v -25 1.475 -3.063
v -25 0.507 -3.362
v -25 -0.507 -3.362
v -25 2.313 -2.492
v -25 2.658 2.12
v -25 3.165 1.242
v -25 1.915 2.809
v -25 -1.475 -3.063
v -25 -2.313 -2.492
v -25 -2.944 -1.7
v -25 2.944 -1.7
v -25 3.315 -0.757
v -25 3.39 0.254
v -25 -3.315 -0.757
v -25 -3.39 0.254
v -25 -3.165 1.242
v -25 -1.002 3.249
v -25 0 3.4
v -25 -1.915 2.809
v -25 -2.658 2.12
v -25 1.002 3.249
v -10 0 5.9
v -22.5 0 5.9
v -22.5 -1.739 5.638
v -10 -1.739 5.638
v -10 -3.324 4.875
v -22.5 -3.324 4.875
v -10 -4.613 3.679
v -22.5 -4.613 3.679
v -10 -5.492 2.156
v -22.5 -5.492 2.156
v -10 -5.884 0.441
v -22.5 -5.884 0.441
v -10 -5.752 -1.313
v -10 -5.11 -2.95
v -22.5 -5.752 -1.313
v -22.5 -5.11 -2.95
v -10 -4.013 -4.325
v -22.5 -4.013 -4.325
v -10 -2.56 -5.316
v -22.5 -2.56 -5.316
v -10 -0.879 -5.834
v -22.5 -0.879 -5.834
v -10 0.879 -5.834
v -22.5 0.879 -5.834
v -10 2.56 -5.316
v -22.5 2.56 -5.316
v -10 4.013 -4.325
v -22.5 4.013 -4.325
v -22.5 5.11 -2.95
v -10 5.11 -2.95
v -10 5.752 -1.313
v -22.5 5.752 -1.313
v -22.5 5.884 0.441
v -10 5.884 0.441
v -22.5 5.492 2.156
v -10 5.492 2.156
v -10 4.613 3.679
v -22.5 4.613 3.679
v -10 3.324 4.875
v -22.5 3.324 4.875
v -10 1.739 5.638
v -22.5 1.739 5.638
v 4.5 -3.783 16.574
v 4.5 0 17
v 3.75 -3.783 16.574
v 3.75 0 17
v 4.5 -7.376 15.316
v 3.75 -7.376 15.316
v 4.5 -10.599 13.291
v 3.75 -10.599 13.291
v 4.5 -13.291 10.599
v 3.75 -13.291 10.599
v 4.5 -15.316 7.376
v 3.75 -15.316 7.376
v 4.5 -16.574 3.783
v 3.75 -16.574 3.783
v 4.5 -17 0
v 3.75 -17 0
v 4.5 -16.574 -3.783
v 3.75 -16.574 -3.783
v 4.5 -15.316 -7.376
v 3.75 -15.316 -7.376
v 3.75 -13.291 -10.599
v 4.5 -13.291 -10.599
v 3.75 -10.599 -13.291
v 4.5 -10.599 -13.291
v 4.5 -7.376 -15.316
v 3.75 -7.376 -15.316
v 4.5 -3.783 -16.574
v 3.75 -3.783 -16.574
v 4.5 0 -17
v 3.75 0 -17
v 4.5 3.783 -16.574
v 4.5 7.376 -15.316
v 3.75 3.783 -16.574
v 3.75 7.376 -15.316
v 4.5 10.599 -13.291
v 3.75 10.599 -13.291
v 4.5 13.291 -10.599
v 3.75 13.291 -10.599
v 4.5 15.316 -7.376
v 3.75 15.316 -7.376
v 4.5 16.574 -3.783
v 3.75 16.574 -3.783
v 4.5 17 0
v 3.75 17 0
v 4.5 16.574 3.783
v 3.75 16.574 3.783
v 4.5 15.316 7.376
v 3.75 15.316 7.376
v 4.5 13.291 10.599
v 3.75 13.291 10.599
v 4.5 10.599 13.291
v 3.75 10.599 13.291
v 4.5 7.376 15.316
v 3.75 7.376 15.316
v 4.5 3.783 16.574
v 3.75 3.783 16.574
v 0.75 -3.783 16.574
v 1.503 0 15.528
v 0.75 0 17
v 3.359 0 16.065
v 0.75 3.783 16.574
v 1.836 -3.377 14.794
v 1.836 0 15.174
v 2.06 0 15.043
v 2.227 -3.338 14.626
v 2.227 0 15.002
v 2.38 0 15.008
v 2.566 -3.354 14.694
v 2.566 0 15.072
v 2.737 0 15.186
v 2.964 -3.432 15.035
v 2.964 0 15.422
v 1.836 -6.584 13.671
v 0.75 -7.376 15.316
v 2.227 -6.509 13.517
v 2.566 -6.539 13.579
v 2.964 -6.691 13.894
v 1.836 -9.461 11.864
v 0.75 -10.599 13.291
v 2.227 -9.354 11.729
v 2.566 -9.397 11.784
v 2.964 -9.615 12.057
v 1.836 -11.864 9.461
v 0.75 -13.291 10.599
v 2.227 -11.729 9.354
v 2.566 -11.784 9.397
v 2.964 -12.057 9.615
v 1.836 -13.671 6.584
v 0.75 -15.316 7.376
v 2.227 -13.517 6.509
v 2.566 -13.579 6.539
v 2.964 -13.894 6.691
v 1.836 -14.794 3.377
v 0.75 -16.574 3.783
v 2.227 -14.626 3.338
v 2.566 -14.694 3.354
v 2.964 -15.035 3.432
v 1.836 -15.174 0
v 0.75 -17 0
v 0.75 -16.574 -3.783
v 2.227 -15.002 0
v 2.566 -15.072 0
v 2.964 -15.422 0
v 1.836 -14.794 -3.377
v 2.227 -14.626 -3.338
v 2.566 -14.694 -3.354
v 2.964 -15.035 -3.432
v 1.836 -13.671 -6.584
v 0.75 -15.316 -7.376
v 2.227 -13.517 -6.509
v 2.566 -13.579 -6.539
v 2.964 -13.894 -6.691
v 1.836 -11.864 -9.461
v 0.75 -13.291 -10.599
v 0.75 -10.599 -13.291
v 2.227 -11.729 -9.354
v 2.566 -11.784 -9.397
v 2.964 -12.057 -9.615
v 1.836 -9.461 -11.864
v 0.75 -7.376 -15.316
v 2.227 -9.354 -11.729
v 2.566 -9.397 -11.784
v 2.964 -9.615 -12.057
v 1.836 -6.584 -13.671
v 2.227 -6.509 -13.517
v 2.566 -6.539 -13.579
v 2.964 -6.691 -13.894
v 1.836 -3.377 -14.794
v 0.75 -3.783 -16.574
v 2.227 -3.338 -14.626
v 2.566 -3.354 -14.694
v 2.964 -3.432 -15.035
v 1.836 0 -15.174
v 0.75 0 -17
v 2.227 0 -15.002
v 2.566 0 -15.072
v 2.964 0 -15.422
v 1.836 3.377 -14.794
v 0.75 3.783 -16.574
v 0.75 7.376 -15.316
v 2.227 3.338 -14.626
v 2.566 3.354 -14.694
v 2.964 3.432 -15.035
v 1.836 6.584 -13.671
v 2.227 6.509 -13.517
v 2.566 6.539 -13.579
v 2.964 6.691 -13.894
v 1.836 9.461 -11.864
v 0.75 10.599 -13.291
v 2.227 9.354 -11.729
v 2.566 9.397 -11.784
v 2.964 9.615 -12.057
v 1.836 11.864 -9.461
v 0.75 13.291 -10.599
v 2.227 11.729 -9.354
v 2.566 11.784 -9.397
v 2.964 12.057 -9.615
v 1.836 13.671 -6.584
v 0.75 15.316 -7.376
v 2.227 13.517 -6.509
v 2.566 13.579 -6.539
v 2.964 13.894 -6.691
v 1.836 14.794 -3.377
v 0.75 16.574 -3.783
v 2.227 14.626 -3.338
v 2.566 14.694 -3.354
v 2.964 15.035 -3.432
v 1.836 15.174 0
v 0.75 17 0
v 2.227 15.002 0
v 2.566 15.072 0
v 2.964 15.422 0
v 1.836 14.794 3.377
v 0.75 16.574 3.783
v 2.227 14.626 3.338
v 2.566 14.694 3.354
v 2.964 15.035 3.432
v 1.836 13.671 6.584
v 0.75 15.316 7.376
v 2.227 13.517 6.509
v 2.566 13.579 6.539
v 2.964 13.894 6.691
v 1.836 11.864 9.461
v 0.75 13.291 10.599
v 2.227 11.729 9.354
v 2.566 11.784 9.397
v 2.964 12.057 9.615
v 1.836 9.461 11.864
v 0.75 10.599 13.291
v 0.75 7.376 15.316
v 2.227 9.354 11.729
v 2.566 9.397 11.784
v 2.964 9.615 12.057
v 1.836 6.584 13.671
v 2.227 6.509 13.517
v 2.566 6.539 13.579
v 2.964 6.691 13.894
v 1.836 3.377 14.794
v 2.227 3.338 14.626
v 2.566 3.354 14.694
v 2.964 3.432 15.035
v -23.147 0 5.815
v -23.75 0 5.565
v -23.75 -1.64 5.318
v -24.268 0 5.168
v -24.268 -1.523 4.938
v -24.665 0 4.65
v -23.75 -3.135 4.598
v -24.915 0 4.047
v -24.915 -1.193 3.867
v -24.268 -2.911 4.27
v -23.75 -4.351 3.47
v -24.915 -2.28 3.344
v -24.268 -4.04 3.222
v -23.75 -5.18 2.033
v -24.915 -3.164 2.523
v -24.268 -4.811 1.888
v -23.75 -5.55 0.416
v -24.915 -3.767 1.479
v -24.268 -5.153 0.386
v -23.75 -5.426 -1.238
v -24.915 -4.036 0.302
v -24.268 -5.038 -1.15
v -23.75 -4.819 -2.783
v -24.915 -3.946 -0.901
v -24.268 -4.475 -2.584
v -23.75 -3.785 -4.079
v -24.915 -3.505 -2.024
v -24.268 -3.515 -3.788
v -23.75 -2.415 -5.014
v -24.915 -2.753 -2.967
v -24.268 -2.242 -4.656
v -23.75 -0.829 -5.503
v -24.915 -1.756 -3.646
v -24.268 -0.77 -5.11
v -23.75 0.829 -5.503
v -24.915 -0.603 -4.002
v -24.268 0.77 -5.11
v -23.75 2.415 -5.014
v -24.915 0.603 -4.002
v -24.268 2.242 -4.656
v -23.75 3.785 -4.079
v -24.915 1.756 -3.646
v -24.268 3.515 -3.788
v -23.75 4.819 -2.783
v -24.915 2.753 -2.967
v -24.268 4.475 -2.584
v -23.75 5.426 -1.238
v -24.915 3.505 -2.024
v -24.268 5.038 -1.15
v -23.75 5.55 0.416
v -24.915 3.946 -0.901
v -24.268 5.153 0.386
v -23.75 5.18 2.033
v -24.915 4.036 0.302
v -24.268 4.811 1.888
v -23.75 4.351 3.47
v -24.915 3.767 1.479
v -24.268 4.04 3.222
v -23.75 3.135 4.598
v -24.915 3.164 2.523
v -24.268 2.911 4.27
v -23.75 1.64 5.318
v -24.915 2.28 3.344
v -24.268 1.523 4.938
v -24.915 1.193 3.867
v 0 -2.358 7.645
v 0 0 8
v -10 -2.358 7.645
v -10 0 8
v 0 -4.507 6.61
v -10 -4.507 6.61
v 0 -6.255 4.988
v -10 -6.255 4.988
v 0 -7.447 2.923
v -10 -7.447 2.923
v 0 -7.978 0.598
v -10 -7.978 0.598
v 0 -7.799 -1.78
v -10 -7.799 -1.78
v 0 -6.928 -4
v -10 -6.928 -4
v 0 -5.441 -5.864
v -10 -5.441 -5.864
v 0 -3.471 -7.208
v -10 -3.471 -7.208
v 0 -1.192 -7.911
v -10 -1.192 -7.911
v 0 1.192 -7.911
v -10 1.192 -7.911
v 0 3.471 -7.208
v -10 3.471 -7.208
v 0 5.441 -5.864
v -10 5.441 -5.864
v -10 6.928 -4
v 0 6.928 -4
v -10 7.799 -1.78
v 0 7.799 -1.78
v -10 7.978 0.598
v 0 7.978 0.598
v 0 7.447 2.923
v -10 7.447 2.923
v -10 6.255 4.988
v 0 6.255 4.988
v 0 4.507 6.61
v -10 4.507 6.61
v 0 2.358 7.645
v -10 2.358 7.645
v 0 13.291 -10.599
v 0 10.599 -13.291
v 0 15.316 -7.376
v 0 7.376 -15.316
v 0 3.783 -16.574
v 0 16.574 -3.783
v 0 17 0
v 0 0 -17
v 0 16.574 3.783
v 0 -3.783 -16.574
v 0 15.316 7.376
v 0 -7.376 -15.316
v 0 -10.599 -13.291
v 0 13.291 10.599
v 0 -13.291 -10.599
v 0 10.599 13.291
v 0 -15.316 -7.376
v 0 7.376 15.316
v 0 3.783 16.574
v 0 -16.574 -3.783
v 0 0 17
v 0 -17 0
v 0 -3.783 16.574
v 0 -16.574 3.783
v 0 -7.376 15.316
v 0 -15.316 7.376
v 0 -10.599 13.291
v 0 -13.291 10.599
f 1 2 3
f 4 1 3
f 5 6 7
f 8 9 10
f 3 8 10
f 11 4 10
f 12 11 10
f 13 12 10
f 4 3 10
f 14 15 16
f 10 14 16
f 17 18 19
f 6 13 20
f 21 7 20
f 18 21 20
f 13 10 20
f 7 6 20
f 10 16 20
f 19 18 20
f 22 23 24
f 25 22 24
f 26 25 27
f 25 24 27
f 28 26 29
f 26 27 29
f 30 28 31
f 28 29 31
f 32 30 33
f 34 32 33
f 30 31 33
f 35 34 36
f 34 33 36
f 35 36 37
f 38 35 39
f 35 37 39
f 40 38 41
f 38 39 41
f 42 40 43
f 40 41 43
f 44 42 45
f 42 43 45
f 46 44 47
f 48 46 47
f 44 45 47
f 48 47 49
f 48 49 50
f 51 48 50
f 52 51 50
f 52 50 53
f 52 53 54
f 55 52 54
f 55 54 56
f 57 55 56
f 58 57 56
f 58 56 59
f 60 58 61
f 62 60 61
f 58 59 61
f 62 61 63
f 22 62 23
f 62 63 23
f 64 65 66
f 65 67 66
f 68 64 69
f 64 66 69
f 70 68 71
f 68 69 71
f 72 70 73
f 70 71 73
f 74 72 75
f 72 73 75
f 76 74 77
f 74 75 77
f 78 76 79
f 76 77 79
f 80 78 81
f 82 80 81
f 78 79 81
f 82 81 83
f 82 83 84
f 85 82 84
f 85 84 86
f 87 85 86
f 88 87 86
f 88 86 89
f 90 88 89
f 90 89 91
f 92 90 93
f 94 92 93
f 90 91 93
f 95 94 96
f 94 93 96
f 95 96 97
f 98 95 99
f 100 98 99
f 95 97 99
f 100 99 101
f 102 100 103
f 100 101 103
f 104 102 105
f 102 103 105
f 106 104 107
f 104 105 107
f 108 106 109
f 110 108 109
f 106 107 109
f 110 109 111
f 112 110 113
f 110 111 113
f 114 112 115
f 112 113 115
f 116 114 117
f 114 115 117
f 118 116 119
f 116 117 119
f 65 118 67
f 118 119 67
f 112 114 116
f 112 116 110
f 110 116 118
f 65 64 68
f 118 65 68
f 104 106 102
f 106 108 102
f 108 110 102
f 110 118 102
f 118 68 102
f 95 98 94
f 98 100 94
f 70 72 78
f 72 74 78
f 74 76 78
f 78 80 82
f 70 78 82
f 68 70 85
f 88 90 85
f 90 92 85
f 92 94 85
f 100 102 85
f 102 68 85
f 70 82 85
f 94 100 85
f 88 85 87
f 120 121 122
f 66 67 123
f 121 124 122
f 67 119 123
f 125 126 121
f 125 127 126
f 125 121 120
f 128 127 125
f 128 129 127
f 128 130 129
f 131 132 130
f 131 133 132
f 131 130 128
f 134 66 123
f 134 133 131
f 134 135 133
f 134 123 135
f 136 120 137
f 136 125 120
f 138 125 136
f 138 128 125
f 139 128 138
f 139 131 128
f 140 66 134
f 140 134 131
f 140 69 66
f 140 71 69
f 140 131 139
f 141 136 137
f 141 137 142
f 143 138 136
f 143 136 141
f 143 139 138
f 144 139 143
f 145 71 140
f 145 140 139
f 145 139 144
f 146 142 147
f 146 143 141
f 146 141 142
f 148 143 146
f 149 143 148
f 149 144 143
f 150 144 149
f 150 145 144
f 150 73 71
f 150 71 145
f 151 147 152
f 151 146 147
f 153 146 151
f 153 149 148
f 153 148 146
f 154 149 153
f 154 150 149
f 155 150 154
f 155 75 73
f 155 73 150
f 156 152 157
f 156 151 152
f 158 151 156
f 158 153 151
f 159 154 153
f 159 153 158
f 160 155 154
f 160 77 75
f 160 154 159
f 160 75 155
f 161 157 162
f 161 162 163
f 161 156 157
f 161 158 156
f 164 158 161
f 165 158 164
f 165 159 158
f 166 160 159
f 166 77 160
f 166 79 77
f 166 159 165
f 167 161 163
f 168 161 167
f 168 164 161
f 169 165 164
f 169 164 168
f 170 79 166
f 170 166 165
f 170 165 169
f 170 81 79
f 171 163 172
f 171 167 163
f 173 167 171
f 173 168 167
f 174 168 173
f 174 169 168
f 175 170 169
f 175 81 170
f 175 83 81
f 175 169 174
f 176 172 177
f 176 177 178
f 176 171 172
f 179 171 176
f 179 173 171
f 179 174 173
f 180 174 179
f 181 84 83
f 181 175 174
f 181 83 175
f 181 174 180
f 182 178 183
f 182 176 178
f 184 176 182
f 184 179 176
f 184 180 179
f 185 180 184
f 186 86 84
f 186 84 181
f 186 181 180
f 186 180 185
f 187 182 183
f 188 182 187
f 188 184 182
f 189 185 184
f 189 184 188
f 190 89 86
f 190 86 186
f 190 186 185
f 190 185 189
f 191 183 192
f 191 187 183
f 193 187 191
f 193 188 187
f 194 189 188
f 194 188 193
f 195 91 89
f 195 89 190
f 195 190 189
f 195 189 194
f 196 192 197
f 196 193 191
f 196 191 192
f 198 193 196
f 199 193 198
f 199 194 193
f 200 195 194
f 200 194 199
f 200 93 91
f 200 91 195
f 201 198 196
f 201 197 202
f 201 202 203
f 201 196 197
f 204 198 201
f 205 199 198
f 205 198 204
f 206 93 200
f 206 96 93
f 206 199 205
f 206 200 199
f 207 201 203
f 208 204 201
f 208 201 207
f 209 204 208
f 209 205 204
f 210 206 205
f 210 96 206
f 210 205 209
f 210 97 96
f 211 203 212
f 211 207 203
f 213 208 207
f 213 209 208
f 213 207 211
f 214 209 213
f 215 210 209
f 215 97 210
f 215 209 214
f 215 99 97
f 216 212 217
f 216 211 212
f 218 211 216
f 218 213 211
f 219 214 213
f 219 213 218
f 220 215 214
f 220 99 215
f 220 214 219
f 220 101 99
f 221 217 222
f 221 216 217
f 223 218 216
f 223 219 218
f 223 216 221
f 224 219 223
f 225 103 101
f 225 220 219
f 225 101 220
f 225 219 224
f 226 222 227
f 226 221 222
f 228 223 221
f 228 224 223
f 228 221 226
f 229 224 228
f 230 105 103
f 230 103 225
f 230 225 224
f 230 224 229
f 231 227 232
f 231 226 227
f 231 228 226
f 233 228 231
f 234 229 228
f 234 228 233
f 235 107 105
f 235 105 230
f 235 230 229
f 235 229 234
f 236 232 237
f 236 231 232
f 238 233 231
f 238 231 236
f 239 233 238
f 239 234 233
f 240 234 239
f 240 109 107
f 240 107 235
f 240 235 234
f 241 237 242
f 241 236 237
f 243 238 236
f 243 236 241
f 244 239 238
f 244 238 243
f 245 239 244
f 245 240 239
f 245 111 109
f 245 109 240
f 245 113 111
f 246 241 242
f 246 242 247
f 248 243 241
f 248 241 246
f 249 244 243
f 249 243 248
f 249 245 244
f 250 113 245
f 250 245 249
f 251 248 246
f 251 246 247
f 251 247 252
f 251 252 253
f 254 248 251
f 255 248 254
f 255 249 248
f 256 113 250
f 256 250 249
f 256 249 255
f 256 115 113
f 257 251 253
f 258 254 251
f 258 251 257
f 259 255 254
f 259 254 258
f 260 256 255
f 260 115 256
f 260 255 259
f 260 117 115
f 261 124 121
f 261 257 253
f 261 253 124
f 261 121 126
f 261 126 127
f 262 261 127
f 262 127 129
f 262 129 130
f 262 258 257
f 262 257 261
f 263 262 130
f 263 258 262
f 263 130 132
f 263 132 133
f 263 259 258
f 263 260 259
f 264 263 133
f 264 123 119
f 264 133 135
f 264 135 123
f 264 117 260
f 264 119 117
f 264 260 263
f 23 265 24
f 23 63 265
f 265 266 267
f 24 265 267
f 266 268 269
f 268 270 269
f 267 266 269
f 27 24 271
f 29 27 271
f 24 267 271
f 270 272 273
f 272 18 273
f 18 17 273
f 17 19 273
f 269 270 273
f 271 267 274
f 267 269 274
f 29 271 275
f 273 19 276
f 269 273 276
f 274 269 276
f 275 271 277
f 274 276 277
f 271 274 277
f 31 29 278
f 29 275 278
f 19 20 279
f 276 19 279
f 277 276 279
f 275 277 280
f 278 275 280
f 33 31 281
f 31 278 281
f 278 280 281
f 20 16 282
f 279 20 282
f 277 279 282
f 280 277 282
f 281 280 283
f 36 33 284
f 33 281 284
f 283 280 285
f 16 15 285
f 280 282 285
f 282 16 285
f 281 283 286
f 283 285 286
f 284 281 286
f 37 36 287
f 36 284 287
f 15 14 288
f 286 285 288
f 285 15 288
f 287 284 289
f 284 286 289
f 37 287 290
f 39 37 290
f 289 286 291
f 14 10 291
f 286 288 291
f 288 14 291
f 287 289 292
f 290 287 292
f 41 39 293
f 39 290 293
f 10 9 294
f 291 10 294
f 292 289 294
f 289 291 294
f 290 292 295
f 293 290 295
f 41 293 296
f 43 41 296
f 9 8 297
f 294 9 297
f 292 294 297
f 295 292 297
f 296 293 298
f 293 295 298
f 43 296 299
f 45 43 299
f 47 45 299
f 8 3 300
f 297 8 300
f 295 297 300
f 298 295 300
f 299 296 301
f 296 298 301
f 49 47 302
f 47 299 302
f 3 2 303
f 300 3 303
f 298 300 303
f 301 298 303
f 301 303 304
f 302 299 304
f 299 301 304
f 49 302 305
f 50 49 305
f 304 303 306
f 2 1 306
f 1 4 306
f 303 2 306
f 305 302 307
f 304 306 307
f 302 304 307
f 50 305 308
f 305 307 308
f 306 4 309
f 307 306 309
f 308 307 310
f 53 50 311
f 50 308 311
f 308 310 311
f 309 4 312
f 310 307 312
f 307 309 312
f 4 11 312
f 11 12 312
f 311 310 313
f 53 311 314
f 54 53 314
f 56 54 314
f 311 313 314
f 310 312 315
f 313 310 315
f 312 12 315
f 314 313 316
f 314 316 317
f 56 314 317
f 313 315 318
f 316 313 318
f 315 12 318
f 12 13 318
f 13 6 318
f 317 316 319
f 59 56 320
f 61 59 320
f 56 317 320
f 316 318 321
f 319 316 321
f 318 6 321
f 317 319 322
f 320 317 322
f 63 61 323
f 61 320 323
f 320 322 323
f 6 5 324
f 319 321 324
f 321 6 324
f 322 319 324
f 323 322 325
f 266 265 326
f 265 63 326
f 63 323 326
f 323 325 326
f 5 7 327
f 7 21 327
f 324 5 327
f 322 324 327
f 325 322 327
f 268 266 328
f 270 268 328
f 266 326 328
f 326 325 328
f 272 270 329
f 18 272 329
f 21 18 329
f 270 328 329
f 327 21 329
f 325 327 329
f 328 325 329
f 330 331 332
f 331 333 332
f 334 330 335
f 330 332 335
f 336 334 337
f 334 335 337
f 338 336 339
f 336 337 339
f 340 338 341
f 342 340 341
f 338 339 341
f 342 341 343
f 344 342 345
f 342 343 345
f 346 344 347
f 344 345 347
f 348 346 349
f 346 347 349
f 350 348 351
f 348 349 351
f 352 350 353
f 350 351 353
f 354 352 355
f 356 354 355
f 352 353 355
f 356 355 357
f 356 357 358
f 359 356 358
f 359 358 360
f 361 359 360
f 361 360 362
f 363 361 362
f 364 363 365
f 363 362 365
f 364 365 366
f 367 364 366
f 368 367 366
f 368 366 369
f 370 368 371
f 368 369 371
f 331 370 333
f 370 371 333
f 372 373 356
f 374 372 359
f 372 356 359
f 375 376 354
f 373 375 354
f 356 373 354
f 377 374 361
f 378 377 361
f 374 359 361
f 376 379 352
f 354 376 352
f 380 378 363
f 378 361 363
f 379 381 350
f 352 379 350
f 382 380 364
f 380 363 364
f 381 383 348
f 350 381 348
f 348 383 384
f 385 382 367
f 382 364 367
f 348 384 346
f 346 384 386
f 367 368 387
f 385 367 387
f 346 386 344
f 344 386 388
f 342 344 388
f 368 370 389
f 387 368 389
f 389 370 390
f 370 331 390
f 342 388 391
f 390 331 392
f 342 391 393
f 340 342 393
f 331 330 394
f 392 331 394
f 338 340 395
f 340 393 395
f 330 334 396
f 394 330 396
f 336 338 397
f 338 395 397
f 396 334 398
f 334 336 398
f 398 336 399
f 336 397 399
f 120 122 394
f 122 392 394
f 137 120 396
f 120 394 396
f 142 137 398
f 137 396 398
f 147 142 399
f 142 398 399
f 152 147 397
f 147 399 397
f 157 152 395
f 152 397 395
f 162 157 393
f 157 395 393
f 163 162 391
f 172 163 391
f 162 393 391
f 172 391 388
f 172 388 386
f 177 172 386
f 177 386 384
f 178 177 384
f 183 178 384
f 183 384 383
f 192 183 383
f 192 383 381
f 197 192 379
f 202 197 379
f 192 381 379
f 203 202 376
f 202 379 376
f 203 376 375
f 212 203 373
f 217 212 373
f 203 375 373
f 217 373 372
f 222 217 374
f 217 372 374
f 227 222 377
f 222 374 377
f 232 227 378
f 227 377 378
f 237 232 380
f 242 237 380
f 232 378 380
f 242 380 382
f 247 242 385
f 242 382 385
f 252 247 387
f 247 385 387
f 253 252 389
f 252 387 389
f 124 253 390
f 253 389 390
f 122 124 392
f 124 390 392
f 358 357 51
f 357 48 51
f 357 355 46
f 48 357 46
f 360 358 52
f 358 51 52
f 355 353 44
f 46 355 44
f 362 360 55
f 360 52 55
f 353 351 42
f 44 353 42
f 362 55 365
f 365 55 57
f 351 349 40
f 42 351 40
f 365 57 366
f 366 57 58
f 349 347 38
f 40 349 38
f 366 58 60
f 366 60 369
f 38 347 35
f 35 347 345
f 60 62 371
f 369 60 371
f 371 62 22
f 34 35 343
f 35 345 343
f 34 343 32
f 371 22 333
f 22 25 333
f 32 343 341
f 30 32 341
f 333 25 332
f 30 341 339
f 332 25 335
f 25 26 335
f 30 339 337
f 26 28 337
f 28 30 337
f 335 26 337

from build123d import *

# Parameters (mm, degrees)
FILLET1_R = 2.5


with BuildPart() as part:
    # Sketch1 → Revolve1 (revolve)
    with BuildSketch(Plane(origin=(0, 0, 0), x_dir=(1, 0, 0), z_dir=(0, 1, 0)), mode=Mode.PRIVATE) as revolve1_sk:
        with BuildLine():
            Line((0, 0), (4.5, 0))
            Line((4.5, 0), (4.5, 17))
            Line((4.5, 17), (3.75, 17))
            add(Edge.make_bspline(
                [(0.75, 17), (2.314018429, 12.999424212), (3.75, 17)],
                knots=[0, 0, 0, 1, 1, 1], degree=2))
            Line((0.75, 17), (0, 17))
            Line((0, 17), (0, 0))
        make_face()
    revolve(revolve1_sk.sketch.rotate(Axis((0, 0, 0), (1, 0, 0)), 180), axis=Axis((0, 0, 0), (1, 0, 0)))

    # Sketch2 → Revolve2 (revolve)
    with BuildSketch(Plane(origin=(0, 0, 0), x_dir=(1, 0, 0), z_dir=(0, 1, 0)), mode=Mode.PRIVATE) as revolve2_sk:
        Polygon((0, 8), (-6.812347486, 8), (-10, 8), (-10, 5.9), (-25, 5.9), (-25, 0), (0, 0), align=None)
    revolve(revolve2_sk.sketch.rotate(Axis((-25, 0, 0), (1, 0, 0)), 180), axis=Axis((-25, 0, 0), (1, 0, 0)))

    # Fillet1
    fillet1_edges = [part.edges().sort_by_distance(p)[0] for p in [
        (-25, 0, -5.9),
    ]]
    fillet(fillet1_edges, radius=FILLET1_R)


solid = part.part
